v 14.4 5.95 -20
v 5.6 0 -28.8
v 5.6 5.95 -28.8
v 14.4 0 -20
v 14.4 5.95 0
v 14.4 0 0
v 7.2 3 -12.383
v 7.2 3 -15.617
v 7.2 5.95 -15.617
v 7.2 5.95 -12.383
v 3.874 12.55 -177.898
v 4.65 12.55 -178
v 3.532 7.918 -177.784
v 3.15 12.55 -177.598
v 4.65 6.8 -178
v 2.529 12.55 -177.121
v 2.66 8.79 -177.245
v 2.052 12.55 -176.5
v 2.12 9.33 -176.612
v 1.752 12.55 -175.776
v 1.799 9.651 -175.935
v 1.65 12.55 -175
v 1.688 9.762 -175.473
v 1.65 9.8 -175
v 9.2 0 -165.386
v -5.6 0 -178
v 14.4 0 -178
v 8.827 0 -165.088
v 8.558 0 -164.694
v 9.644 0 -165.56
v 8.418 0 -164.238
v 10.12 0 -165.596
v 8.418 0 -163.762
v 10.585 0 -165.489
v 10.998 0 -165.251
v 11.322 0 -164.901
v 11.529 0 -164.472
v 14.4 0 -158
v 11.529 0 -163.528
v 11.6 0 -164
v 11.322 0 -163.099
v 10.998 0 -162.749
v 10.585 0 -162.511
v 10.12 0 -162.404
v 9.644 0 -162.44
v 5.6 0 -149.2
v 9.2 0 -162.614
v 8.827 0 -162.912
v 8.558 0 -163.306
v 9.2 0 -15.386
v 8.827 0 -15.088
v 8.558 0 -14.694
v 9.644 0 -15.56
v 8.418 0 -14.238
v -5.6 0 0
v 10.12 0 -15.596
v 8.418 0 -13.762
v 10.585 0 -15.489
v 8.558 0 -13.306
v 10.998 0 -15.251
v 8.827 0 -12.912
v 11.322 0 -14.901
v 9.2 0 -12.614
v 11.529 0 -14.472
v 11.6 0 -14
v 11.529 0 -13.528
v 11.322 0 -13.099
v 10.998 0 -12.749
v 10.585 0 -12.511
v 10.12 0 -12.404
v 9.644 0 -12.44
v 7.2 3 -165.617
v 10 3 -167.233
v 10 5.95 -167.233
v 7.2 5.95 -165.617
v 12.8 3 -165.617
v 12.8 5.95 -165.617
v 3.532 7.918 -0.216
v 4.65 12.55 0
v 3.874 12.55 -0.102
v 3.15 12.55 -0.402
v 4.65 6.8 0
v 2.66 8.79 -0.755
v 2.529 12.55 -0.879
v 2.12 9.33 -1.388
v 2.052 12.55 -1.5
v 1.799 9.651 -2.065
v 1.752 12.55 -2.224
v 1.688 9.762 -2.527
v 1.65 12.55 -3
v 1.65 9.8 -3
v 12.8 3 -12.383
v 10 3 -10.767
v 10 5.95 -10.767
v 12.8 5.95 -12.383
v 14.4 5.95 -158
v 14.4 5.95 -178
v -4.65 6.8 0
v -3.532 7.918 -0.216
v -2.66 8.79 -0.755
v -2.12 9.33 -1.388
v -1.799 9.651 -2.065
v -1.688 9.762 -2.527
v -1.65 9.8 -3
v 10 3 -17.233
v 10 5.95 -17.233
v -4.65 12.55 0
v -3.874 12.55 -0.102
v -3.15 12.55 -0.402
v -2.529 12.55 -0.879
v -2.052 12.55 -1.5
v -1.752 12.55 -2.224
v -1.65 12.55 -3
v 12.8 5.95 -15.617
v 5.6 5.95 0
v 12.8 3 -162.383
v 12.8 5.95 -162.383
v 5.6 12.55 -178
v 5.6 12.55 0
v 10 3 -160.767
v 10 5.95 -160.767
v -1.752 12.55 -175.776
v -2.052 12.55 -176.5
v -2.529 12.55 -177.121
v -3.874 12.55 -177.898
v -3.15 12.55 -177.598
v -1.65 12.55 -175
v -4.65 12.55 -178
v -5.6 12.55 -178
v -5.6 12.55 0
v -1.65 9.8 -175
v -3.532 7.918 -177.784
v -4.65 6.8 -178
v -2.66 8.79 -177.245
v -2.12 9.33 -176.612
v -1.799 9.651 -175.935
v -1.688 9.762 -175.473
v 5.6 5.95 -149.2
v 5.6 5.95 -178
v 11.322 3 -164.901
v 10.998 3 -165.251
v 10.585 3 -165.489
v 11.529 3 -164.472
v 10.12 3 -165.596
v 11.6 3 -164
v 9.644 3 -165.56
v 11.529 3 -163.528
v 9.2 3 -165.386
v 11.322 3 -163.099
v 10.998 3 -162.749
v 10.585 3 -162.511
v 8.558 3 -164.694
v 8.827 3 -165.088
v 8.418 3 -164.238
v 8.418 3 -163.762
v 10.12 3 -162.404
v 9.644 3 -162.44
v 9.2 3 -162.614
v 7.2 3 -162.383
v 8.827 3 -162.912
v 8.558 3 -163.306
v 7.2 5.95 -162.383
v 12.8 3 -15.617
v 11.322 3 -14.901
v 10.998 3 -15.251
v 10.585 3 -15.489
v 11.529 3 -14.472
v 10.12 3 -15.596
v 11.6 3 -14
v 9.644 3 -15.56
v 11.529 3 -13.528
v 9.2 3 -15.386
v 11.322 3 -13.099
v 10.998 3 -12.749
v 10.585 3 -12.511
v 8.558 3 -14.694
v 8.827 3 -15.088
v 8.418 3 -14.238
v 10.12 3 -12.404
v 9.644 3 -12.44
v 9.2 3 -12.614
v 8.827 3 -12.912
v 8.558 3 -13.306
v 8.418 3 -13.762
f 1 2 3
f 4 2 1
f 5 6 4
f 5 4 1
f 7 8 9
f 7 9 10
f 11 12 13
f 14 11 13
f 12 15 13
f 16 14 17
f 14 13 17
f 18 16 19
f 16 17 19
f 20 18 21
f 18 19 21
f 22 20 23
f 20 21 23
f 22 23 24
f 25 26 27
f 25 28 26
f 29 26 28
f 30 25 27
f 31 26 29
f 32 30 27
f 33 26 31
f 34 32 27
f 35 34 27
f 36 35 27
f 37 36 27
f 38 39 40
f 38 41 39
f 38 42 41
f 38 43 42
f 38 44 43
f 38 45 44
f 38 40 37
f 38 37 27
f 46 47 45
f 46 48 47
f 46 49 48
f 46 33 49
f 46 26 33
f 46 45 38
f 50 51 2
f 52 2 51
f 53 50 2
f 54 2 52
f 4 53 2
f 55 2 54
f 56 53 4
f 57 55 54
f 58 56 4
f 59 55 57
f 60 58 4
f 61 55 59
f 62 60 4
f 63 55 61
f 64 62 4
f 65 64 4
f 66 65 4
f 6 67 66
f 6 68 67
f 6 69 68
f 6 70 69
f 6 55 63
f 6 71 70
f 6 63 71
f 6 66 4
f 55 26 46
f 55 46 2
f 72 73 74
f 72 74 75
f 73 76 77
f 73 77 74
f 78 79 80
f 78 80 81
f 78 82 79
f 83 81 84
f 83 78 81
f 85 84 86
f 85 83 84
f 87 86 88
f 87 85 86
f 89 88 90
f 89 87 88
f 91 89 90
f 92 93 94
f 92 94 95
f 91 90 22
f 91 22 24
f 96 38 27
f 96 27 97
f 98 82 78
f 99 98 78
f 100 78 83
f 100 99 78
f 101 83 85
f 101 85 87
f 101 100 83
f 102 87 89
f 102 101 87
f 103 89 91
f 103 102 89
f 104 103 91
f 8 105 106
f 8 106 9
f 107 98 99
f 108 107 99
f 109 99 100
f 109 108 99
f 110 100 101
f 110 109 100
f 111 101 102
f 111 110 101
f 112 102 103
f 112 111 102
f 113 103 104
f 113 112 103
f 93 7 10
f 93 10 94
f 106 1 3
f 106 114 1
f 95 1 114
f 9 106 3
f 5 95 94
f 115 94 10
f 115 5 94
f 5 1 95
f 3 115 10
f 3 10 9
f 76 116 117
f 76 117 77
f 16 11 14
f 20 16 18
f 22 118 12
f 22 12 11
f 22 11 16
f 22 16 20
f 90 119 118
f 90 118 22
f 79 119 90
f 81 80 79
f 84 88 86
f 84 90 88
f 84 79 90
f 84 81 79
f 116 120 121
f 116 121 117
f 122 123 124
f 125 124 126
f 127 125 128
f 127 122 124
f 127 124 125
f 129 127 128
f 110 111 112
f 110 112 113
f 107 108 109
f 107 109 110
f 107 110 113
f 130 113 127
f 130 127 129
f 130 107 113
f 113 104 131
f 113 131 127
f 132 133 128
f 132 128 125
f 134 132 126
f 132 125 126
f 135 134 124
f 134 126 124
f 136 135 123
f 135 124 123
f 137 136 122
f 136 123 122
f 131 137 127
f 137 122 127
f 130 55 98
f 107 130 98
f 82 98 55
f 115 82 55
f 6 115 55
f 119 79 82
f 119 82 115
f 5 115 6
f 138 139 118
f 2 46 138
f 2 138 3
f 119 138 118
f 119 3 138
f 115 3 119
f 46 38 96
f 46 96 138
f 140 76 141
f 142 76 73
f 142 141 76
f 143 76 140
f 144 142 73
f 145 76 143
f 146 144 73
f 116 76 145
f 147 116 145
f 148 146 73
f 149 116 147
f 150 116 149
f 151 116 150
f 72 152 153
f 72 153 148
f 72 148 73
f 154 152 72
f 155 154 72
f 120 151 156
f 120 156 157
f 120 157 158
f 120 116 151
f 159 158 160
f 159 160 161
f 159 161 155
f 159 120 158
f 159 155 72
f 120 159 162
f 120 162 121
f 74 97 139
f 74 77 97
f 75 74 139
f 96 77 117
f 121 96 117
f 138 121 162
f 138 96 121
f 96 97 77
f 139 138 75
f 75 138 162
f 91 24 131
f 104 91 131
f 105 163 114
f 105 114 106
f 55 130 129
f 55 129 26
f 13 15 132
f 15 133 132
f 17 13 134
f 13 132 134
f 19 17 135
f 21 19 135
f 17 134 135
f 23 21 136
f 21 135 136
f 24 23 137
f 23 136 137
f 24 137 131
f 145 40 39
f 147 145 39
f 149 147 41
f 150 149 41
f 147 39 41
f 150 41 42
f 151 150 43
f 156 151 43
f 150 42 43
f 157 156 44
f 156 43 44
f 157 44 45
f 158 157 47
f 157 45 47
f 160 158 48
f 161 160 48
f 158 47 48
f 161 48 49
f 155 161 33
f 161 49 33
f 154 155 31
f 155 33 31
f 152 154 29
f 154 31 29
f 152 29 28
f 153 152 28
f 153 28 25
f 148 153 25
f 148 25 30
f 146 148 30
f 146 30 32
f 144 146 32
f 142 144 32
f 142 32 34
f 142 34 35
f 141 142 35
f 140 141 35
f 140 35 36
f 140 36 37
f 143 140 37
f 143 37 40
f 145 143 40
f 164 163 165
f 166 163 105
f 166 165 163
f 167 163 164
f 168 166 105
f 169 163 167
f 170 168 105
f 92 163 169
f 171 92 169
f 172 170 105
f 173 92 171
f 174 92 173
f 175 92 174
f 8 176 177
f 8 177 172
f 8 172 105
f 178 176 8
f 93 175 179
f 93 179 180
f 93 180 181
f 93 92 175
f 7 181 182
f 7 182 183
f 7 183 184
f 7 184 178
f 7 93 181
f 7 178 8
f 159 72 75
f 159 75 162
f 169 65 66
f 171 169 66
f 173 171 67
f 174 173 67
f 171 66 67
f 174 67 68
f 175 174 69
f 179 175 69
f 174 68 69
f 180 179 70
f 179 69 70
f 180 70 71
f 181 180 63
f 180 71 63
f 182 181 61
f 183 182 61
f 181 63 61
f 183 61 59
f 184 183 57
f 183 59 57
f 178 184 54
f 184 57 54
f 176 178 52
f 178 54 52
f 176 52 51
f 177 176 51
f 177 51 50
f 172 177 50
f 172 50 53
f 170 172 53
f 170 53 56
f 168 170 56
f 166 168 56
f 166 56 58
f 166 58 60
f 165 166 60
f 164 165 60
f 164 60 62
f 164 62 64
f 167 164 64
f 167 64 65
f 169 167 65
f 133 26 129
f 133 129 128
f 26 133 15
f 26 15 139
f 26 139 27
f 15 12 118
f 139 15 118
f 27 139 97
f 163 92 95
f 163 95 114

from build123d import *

# Parameters (mm, degrees)
PAD_DEPTH       = 178
SKETCH001_R     = 1.6
POCKET_DEPTH    = 12.551
POCKET002_DEPTH = 5
FILLET_R        = 3


with BuildPart() as part:
    # Sketch → Pad (new body)
    with BuildSketch(Plane.XY):
        Polygon((-5.6, 0), (14.4, 0), (14.4, 5.95), (5.6, 5.95), (5.6, 12.55), (1.65, 12.55), (1.65, 9.8), (-1.65, 9.8), (-1.65, 12.55), (-5.6, 12.55), align=None)
    extrude(amount=-PAD_DEPTH)

    # Sketch001 (on Face6 of Pad) → Pocket (cut, through all)
    with BuildSketch(Plane.XZ):
        with Locations((10, -164)):
            Circle(SKETCH001_R)
        with Locations((10, -14)):
            Circle(SKETCH001_R)
        Polygon((14.4, -158), (5.6, -149.2), (5.6, -28.8), (14.4, -20), align=None)
    extrude(amount=-POCKET_DEPTH, mode=Mode.SUBTRACT)

    # Sketch003 (on DatumPlane) → Pocket002 (cut)
    with BuildSketch(Plane(origin=(0, 3, 0), x_dir=(-1, 0, 0), z_dir=(0, 1, 0))):
        Polygon((-7.2, -15.616581), (-7.2, -12.383419), (-10, -10.766838), (-12.8, -12.383419), (-12.8, -15.616581), (-10, -17.233162), align=None)
        Polygon((-7.2, -165.616581), (-7.2, -162.383419), (-10, -160.766838), (-12.8, -162.383419), (-12.8, -165.616581), (-10, -167.233162), align=None)
    extrude(amount=POCKET002_DEPTH, mode=Mode.SUBTRACT)

    # Fillet
    fillet_edges = [part.edges().sort_by_distance(p)[0] for p in [
        (-1.65, 11.175, 0),
        (0, 9.8, 0),
        (1.65, 11.175, 0),
        (0, 9.8, -178),
        (-1.65, 11.175, -178),
        (1.65, 11.175, -178),
    ]]
    fillet(fillet_edges, radius=FILLET_R)


solid = part.part
